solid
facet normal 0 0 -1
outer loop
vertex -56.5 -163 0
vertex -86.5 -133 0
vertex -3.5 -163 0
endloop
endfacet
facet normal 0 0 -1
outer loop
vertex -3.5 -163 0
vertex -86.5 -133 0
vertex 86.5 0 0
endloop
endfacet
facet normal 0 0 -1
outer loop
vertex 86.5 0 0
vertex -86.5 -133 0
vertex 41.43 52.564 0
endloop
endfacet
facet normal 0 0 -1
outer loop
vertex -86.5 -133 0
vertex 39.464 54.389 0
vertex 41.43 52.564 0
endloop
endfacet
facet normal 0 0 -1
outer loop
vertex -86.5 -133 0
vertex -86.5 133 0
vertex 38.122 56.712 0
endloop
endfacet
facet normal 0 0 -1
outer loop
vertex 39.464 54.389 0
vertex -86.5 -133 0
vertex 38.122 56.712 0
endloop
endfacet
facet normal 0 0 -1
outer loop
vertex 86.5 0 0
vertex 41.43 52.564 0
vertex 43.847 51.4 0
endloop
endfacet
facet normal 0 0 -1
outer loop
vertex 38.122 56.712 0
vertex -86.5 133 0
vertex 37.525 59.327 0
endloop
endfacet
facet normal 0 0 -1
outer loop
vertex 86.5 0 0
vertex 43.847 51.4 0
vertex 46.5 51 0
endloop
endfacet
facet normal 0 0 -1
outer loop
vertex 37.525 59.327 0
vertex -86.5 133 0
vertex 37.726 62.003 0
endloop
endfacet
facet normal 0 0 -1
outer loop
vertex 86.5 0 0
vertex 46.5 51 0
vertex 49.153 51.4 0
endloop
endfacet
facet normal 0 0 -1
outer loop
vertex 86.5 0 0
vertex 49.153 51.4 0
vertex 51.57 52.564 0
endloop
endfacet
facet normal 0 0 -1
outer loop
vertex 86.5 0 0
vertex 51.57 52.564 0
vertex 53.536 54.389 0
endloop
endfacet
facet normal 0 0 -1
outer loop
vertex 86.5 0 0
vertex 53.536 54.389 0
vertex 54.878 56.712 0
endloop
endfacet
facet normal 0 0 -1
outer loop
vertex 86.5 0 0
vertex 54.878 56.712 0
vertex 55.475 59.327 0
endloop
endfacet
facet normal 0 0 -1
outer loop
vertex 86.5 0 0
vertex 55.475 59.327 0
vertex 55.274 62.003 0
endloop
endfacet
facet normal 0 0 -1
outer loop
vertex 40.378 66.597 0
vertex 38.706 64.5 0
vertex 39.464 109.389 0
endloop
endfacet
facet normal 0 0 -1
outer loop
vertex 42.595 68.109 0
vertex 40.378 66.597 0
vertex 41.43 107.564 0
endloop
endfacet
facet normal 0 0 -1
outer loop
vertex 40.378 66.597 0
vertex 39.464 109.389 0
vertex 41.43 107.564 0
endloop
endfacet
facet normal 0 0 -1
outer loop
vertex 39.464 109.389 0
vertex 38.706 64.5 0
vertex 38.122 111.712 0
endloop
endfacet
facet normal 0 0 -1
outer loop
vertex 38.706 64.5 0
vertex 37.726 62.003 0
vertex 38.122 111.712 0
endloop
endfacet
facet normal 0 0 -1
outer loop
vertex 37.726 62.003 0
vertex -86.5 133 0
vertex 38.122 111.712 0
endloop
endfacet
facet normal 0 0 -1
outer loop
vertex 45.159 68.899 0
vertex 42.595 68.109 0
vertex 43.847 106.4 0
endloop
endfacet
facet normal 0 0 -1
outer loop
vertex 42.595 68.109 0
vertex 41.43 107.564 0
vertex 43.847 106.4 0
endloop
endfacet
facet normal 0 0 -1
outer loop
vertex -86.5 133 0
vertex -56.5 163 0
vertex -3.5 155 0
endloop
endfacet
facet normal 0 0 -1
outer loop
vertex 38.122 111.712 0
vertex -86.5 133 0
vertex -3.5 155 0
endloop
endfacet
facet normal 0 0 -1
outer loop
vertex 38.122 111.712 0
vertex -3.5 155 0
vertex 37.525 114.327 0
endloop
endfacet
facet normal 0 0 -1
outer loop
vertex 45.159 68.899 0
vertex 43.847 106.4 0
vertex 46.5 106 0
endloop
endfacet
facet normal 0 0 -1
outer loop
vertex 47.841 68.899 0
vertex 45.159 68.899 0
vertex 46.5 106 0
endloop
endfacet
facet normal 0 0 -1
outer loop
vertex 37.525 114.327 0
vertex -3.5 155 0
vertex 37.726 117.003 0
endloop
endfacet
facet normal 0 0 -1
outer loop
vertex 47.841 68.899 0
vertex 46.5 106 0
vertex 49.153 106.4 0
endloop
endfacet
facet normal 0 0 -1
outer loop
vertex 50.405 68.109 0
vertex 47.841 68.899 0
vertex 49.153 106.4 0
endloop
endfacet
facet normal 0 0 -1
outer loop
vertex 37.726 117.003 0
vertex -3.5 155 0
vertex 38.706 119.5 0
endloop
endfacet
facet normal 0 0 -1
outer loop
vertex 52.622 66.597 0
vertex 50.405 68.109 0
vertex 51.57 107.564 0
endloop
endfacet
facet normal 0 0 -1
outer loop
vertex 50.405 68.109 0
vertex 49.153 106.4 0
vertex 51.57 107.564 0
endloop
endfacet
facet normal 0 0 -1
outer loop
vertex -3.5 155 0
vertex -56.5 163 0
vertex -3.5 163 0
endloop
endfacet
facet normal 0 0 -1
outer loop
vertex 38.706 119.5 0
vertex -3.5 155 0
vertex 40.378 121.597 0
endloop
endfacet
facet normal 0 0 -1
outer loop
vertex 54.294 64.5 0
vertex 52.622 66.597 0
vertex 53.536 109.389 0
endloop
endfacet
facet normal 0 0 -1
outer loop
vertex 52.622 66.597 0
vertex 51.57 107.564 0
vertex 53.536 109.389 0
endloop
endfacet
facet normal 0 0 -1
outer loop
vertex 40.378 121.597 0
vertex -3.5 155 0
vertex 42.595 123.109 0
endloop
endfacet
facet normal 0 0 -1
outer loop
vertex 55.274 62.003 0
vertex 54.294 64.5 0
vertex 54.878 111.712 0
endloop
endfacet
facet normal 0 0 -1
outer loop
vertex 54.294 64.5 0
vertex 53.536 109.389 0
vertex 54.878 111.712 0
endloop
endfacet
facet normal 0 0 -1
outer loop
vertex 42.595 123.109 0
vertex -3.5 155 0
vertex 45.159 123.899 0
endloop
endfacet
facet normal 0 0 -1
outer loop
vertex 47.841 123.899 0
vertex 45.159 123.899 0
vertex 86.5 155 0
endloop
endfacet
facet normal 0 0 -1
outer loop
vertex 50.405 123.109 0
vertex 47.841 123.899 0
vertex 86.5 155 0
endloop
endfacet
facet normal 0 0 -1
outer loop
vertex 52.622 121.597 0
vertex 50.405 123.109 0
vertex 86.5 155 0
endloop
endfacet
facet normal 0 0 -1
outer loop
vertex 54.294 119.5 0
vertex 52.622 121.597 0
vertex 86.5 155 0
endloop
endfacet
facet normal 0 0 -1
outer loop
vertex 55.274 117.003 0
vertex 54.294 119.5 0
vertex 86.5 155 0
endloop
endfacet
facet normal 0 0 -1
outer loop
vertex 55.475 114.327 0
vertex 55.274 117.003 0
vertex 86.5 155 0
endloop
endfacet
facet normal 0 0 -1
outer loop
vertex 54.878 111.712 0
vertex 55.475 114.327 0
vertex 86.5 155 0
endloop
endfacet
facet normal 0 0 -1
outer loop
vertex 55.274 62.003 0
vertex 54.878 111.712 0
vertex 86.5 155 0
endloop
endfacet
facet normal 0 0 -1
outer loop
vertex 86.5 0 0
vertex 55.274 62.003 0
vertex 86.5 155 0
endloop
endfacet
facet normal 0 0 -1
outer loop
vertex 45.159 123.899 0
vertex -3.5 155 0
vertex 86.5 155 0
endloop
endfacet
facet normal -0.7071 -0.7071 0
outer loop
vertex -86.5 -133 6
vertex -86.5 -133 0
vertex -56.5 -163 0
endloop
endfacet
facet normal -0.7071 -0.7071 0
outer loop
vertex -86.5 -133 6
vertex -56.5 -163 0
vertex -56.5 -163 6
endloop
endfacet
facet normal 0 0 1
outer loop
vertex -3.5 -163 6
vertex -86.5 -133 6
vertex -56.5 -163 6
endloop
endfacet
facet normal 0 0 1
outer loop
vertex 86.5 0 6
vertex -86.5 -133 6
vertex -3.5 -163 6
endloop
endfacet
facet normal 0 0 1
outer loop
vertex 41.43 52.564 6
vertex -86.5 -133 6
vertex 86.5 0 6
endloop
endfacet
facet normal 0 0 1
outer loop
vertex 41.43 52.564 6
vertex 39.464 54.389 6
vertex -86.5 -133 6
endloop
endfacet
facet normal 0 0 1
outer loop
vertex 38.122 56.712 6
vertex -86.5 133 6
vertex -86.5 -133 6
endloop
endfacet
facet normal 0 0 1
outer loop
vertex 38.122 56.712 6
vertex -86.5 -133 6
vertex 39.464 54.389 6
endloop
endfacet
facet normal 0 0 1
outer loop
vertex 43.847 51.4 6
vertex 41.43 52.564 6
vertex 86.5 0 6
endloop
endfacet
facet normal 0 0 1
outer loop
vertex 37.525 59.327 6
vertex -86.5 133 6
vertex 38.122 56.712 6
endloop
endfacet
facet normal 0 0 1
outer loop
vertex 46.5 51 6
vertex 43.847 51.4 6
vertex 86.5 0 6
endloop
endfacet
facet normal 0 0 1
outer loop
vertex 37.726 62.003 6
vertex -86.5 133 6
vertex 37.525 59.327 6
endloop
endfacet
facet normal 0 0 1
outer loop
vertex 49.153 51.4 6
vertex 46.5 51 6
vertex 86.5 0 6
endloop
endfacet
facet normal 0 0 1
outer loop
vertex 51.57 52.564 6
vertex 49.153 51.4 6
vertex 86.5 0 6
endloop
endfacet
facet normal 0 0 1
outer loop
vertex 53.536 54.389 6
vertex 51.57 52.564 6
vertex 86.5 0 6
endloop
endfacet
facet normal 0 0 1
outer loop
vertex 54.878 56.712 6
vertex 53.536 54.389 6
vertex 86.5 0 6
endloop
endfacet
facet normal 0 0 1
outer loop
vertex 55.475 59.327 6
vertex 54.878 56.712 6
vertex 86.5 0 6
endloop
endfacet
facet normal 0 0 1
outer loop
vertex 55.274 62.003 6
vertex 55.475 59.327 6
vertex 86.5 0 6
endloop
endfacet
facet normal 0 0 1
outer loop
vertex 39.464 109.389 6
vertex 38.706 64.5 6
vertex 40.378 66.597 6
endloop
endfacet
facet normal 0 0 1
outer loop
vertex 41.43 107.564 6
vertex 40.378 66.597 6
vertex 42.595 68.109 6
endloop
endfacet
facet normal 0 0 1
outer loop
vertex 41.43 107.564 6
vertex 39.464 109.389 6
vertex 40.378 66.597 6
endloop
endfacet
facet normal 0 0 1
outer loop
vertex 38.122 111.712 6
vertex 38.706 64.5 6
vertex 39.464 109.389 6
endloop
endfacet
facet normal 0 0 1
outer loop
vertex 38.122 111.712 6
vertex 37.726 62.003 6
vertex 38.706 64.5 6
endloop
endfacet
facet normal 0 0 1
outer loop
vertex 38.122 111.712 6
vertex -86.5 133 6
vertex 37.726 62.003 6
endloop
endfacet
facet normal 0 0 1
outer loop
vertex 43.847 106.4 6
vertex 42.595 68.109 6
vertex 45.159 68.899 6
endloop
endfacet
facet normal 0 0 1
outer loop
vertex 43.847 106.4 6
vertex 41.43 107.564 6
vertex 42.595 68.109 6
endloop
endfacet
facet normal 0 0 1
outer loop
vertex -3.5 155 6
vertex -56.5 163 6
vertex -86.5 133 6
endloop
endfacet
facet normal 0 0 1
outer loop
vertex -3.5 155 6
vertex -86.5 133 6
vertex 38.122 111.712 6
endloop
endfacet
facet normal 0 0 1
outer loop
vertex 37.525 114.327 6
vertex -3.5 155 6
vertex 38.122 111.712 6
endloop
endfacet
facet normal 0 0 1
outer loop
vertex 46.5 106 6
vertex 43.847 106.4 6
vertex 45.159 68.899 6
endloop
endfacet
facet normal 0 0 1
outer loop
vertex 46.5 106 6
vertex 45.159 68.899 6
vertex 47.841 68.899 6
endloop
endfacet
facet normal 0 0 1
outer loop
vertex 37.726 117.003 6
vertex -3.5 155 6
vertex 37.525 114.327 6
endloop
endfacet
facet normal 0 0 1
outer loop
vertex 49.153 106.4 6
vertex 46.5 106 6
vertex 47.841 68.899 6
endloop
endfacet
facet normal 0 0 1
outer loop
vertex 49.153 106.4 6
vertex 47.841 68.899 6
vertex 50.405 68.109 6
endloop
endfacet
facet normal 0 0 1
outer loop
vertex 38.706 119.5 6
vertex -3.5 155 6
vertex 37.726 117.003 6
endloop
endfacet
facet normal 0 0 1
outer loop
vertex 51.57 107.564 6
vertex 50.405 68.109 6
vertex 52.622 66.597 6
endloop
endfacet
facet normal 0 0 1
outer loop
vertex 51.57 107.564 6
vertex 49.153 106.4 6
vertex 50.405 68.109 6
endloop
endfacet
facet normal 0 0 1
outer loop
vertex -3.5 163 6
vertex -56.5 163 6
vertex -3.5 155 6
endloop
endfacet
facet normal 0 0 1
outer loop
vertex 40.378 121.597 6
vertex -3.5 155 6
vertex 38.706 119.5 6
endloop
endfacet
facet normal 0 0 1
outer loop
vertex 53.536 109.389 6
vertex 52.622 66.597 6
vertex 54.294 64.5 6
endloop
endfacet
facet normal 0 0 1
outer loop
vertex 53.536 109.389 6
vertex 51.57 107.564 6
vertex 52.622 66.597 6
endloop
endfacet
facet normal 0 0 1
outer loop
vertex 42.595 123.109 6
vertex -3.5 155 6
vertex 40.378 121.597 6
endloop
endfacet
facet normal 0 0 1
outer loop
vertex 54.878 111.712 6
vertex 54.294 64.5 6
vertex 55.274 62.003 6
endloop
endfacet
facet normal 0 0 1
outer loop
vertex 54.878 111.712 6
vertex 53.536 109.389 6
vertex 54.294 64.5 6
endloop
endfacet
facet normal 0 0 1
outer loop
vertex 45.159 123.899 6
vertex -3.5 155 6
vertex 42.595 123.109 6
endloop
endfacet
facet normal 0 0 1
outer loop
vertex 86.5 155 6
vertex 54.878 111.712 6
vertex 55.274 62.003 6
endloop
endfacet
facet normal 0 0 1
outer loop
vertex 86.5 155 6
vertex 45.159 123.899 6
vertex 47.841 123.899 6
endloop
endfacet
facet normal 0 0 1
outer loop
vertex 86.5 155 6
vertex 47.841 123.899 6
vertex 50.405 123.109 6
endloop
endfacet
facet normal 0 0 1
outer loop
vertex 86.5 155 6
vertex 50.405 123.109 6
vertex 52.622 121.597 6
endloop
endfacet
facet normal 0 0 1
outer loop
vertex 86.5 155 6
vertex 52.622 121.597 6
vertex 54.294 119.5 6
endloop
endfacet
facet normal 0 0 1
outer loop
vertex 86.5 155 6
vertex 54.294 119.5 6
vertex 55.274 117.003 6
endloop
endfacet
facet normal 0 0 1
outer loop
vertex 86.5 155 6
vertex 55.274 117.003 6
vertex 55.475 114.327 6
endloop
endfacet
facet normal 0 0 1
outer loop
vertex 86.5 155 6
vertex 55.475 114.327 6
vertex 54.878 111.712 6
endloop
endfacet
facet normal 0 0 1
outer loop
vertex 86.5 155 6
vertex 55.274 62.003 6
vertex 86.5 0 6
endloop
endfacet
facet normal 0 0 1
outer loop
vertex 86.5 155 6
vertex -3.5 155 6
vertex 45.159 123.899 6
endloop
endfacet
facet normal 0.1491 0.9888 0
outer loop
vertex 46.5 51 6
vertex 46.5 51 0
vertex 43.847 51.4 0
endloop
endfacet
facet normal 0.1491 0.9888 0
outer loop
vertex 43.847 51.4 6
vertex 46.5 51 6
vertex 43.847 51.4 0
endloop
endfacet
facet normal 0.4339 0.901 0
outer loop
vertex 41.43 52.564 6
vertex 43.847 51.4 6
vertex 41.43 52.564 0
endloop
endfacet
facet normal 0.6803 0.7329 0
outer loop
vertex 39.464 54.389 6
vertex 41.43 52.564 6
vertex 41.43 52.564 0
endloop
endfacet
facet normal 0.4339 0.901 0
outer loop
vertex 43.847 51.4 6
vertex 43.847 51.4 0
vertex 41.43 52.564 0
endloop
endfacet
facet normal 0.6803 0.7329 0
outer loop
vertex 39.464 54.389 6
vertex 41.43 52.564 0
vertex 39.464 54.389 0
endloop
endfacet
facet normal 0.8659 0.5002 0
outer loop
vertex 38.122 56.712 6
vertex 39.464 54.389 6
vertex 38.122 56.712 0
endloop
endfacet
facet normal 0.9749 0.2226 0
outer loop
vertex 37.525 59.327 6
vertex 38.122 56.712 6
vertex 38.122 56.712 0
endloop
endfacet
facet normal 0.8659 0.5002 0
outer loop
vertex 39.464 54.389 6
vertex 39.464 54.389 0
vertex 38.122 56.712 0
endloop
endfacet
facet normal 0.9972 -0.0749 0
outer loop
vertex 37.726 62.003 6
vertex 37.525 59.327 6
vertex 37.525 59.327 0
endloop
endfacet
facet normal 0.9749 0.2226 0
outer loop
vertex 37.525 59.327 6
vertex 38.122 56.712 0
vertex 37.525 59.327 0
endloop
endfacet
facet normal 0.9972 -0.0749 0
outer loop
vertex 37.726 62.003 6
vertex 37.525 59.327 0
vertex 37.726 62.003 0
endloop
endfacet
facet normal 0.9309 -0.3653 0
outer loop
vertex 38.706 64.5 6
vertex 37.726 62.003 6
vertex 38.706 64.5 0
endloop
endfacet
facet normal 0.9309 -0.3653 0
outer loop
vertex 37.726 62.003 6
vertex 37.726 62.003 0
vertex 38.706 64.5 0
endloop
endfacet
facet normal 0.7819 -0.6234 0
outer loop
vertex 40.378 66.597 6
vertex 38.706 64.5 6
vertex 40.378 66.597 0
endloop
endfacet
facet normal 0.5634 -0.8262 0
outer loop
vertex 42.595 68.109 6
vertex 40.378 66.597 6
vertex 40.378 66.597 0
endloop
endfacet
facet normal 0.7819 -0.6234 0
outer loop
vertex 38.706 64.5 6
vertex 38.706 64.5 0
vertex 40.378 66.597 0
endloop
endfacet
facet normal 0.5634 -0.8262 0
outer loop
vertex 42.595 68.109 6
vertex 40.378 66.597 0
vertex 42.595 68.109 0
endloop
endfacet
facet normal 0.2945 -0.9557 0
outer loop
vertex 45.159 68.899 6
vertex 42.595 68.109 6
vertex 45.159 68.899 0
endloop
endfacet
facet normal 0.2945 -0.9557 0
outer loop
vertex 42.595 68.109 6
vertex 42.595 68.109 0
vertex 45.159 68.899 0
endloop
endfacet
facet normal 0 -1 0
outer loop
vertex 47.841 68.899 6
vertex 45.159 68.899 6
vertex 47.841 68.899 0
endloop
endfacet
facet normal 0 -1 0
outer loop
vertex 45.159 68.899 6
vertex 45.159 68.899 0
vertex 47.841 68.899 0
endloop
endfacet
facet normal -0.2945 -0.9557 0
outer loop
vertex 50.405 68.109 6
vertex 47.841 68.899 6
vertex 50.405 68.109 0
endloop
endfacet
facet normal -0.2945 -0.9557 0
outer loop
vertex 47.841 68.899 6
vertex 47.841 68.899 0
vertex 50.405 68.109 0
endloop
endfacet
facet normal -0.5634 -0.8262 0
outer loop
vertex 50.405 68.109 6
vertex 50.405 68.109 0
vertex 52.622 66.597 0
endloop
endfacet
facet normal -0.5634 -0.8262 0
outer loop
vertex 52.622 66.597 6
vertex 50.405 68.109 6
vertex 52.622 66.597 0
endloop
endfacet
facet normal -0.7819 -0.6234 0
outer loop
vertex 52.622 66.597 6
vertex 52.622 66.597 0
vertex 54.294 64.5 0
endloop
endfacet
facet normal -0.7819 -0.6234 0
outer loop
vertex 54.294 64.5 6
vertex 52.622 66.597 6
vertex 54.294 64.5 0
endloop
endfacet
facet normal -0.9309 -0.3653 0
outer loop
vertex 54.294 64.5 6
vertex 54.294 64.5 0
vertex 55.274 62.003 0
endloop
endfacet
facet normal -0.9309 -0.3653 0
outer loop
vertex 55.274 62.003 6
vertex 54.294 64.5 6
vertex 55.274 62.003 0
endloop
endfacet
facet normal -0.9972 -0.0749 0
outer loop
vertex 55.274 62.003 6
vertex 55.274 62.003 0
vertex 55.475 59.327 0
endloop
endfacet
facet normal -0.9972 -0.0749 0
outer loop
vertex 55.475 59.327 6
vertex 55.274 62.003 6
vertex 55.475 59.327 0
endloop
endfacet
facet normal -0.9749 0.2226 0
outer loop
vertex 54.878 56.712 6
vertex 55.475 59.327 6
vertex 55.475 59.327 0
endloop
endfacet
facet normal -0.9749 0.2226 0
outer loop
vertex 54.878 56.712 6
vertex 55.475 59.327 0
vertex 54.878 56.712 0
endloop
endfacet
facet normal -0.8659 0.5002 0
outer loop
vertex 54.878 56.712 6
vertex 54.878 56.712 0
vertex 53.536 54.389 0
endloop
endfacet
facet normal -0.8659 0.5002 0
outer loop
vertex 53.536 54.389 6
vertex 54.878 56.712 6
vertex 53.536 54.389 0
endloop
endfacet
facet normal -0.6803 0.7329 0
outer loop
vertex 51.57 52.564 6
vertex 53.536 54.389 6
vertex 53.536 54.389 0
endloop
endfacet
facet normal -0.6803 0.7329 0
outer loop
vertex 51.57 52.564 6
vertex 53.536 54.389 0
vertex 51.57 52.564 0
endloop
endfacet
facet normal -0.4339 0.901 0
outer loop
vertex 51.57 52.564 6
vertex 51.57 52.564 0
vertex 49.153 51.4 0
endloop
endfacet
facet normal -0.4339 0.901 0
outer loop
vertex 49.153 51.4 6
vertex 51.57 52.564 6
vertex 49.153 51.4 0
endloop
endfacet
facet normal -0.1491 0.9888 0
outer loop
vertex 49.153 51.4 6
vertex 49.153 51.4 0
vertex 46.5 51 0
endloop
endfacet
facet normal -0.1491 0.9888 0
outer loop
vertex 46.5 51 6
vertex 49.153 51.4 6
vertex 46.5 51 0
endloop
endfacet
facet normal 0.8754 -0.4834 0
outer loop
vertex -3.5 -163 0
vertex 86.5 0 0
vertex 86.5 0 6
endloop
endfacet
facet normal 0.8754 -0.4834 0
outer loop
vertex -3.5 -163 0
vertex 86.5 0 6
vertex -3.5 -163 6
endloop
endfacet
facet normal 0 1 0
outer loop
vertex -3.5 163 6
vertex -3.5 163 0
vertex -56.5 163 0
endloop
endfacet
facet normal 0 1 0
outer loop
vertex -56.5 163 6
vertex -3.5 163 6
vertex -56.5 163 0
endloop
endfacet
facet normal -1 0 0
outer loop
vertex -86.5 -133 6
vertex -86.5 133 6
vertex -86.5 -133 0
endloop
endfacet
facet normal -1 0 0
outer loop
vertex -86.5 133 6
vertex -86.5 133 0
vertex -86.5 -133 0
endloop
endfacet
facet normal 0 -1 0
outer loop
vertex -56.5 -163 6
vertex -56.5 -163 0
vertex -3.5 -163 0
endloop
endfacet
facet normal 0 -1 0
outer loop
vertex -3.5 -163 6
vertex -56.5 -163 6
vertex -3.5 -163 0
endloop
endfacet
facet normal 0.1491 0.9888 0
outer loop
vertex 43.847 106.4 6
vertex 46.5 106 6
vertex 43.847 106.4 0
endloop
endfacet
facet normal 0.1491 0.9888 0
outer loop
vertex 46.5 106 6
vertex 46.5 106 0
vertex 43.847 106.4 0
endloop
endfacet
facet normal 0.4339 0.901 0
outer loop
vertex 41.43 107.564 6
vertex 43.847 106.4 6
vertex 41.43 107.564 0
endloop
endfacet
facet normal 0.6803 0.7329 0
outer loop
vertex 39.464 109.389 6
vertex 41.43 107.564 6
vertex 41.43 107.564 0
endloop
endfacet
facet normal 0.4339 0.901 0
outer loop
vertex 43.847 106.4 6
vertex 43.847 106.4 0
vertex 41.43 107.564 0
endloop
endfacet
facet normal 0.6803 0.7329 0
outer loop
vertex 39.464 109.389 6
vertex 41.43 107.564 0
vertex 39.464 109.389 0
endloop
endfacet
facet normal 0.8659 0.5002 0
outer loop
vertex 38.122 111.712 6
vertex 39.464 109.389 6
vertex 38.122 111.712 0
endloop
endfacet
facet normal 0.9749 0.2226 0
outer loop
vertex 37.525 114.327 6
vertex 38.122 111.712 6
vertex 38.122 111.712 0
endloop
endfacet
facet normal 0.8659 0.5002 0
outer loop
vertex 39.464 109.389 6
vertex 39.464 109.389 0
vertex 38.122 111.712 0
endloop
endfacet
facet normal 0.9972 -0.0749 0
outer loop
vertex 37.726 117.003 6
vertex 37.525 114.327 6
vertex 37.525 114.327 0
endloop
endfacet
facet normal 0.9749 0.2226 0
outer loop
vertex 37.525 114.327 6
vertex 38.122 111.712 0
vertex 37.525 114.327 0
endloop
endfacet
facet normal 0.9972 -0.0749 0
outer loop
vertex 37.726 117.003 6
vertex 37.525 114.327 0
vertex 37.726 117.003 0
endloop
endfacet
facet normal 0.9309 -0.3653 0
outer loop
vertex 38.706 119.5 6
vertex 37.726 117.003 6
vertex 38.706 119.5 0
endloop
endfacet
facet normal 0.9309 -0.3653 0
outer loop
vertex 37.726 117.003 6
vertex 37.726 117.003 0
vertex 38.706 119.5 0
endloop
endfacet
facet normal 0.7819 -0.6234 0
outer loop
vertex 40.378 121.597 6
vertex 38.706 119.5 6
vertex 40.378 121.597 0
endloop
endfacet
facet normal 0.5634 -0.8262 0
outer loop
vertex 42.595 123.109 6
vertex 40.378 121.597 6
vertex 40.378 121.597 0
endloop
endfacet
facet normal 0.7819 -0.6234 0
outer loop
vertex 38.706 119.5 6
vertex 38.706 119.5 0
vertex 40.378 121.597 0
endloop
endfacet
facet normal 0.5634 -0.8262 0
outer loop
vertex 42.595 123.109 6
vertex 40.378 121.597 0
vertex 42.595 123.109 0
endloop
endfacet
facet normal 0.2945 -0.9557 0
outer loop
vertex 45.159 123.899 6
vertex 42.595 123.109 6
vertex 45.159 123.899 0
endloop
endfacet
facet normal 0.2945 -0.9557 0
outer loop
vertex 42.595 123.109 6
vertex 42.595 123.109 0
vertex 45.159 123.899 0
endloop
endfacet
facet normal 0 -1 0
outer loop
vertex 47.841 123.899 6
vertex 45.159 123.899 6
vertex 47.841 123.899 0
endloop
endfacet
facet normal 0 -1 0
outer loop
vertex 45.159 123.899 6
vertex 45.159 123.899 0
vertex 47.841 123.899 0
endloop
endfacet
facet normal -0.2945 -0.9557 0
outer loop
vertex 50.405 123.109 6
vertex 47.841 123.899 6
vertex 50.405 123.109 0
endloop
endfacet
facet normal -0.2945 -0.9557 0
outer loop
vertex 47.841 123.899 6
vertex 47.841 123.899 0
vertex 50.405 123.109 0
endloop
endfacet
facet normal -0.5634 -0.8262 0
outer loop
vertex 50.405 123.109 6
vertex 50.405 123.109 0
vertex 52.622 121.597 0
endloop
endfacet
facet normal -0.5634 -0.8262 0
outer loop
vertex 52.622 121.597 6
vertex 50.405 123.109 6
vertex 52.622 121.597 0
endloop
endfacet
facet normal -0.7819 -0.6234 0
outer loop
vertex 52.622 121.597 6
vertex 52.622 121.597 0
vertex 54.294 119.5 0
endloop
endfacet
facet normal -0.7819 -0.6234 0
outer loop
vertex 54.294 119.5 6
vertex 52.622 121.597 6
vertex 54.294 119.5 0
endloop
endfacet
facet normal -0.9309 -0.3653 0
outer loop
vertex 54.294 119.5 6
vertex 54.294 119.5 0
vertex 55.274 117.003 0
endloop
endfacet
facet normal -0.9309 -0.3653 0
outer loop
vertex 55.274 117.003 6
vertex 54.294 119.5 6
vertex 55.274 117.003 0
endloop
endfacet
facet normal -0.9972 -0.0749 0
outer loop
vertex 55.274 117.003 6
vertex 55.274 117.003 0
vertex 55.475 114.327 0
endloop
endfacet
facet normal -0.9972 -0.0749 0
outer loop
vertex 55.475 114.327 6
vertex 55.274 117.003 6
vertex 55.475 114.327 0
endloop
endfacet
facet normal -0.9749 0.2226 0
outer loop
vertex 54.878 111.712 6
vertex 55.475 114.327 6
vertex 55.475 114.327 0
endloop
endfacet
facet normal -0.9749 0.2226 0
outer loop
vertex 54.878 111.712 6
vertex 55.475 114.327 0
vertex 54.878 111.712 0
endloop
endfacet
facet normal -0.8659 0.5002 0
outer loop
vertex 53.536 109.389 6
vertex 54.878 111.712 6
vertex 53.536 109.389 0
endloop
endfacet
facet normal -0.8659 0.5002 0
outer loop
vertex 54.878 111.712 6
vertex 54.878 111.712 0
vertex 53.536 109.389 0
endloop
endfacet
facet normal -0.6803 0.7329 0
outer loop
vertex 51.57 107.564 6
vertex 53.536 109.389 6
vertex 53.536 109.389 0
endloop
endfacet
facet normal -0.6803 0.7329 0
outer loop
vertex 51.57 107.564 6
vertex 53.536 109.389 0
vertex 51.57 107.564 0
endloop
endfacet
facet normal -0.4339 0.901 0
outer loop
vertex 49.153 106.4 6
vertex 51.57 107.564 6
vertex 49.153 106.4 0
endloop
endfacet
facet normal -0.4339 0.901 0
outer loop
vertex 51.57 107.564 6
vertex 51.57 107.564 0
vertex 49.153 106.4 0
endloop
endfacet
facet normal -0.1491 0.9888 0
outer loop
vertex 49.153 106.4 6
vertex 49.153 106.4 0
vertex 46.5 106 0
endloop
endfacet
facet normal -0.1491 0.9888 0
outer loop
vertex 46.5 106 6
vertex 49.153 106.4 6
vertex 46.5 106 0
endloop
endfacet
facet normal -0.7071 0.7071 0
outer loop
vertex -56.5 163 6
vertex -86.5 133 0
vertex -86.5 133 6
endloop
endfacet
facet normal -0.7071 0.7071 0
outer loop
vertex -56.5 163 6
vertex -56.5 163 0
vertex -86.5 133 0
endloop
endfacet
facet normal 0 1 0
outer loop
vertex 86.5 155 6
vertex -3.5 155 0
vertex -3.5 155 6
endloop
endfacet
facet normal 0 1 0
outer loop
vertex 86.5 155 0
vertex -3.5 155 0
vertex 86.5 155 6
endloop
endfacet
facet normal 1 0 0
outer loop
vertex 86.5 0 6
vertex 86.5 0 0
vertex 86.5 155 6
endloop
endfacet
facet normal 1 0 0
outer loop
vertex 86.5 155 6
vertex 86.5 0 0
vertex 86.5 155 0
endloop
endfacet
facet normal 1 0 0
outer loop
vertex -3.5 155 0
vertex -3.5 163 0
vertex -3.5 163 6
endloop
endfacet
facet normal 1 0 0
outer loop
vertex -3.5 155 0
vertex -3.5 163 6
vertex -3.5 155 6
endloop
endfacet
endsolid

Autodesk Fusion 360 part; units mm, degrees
sketch "スケッチ1" plane through (0, 0, 0) normal (0, 0, 1) x (1, 0, 0)
  line L0 (-3.5, 163) -> (-86.5, 163)
  line L1 (-86.5, 163) -> (-86.5, -163)
  line L2 (-86.5, -163) -> (-3.5, -163)
  line L3 (86.5, 0) -> (86.5, 155)
  line L4 (82.2546, 155) -> (-86.5, -163) construction
  line L5 (-86.5, 163) -> (42.3924, -79.8839) construction
  line L6 (-3.5, 163) -> (-3.5, 155)
  line L7 (-3.5, 155) -> (86.5, 155)
  line L8 (-86.5, -163) -> (-3.5, -163) construction
  line L9 (86.5, 0) -> (-3.5, -163)
  dimension "d2" = 326
  dimension "d5" = 83
extrude "押し出し1" add sketch "スケッチ1" along normal blind 6
chamfer "面取り1" distance 30 angle 45 2 edges at (-86.5, -163, 3) (-86.5, 163, 3)
sketch "スケッチ2" plane through (0, 0, 6) normal (0, 0, 1) x (-1, 0, 0)
  line L0 (56.5, -163) -> (86.5, -133)
  line L1 (86.5, -133) -> (86.5, 133)
  line L2 (86.5, 133) -> (56.5, 163)
  line L3 (56.5, 163) -> (3.5, 163)
  line L4 (3.5, 163) -> (-86.5, 0)
  line L5 (-86.5, 0) -> (-86.5, -155)
  line L6 (-86.5, -155) -> (3.5, -155)
  line L7 (3.5, -155) -> (3.5, -163)
  line L8 (3.5, -163) -> (56.5, -163)
  line L9 (-86.5, -155) -> (-46.5, -155) construction
  line L10 (-46.5, -155) -> (-46.5, -115) construction
  line L11 (-46.5, -115) -> (-86.5, -115) construction
  line L12 (-86.5, -115) -> (-86.5, -155) construction
  line L13 (-46.5, -115) -> (-46.5, -60) construction
  point P0 (-46.5, -115)
  dimension "d10" = 40
  dimension "d11" = 40
  dimension "d12" = 55
hole "穴1" at (46.5, 115, 6) at (46.5, 60, 6) direction (0, 0, -1) diameter 18 end through all
equation "d5 = 30 mm + 53 mm"
